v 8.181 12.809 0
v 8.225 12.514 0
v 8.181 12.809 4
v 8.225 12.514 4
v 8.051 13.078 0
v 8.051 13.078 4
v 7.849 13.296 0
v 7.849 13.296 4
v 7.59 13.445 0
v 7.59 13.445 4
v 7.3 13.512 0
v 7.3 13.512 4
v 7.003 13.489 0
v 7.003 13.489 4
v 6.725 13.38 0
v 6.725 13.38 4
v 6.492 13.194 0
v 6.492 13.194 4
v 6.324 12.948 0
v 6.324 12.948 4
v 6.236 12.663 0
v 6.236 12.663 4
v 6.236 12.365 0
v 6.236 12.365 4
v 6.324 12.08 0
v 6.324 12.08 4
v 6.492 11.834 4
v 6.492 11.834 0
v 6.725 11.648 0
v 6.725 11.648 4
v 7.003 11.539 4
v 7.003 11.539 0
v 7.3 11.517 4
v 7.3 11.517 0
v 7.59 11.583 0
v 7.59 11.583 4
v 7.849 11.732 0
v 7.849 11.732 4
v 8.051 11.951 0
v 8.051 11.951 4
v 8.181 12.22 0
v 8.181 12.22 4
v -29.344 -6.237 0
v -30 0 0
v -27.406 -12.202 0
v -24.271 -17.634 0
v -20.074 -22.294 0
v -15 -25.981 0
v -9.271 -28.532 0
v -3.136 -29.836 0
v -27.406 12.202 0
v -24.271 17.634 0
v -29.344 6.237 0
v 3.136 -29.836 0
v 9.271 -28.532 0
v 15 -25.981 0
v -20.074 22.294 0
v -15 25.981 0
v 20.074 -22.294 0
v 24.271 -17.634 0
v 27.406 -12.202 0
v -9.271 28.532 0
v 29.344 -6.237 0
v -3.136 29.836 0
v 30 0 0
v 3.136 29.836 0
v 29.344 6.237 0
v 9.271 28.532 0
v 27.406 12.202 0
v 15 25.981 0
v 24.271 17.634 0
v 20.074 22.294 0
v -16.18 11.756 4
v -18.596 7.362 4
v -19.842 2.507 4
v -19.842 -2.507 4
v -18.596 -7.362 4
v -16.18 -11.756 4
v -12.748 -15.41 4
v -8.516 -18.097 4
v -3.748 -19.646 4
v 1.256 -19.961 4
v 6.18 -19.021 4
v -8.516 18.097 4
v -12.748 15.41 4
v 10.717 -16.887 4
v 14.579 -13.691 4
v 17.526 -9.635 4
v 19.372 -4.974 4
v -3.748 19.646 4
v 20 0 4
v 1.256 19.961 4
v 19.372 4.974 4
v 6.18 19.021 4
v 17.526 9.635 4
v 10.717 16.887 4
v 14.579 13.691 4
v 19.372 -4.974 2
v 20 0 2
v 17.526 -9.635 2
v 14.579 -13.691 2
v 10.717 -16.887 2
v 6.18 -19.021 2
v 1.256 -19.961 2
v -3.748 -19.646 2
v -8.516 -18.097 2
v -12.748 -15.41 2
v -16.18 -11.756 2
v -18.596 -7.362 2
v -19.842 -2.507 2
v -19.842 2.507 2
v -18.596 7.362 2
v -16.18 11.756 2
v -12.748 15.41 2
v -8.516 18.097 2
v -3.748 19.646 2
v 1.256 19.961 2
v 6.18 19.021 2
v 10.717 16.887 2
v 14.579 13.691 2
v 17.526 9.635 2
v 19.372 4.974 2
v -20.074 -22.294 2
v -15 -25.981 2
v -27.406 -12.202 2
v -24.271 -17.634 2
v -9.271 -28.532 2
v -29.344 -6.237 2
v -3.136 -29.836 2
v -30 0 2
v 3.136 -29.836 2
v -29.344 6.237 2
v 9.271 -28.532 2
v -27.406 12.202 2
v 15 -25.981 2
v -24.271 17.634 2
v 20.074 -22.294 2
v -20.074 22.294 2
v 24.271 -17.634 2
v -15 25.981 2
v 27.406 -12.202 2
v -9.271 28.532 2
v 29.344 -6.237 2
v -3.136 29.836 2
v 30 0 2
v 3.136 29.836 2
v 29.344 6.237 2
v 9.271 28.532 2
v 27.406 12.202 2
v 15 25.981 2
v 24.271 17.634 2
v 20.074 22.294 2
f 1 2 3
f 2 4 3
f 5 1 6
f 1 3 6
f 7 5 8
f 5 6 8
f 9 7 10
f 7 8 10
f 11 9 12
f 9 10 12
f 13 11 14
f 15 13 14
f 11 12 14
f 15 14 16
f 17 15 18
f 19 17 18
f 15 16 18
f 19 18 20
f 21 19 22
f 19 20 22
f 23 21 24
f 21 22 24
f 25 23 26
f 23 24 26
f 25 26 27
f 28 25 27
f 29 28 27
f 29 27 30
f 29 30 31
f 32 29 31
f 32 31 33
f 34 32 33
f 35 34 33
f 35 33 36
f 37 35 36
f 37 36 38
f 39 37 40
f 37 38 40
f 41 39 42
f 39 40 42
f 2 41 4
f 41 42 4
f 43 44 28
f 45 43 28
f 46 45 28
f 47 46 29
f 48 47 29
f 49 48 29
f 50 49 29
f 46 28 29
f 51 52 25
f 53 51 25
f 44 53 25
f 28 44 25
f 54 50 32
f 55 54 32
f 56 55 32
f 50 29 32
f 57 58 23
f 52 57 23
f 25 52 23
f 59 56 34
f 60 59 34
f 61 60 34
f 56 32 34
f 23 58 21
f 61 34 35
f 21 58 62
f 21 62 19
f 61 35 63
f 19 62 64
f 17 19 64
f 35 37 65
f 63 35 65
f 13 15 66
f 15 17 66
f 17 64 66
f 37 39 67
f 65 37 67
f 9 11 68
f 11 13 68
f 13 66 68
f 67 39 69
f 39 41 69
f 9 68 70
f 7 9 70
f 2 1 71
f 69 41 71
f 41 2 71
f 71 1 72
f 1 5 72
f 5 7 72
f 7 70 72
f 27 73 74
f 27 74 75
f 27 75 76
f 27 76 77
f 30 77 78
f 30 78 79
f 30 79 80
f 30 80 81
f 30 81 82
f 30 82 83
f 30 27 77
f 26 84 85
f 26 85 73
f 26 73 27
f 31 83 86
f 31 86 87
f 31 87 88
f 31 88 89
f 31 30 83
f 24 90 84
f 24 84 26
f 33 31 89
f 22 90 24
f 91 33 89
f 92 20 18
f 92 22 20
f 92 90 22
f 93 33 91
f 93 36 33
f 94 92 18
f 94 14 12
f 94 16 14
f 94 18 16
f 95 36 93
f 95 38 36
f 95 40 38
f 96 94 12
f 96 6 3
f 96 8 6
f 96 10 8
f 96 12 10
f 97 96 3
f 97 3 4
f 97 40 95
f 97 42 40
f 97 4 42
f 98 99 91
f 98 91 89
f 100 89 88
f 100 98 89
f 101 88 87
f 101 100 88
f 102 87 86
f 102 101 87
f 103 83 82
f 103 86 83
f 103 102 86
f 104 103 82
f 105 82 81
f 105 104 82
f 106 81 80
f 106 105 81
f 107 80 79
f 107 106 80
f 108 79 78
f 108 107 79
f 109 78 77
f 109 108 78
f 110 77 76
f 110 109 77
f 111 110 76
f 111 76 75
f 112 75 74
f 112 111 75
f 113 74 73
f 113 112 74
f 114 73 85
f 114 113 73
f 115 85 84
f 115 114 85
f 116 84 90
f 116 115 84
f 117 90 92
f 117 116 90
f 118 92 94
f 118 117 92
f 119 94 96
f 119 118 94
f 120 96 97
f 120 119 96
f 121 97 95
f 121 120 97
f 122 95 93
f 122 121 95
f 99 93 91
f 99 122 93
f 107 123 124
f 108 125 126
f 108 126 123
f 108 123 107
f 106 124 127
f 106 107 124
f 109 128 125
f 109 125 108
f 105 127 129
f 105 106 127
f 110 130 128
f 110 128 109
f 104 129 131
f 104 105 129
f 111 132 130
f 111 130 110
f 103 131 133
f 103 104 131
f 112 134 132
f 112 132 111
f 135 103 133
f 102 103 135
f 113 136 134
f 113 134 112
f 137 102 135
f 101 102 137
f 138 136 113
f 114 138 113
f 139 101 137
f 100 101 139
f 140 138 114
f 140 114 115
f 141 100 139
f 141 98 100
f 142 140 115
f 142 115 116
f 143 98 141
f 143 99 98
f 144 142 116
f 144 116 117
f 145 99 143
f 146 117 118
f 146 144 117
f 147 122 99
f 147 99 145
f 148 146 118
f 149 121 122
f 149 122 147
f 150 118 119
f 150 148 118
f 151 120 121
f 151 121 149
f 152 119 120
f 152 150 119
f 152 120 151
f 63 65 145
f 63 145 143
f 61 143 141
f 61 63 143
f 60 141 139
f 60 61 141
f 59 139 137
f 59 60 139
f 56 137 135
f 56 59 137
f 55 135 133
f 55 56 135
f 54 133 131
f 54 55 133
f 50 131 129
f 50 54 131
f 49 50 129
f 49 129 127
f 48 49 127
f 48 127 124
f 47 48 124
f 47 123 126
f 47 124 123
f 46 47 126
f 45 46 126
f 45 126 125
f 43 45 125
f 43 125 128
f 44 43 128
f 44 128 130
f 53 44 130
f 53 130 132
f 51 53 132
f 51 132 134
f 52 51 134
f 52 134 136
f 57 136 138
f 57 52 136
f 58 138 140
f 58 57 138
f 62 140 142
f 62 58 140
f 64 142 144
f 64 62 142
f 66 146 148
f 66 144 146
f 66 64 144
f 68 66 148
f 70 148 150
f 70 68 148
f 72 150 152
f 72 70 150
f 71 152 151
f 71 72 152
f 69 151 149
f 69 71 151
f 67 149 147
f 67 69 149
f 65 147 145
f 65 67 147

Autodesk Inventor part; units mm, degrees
ref_plane "YZ Plane" through (0, 0, 0) normal (1, 0, 0) x (0, 1, 0)
ref_plane "XZ Plane" through (0, 0, 0) normal (0, 1, 0) x (-1, 0, 0)
ref_plane "XY Plane" through (0, 0, 0) normal (0, 0, 1) x (1, 0, 0)
sketch "Эскиз1" plane through (0, 0, 0) normal (0, 0, 1) x (1, 0, 0)
  circle A0 centre (0, 0) radius 30
  dimension "d0" = 60
extrude "Выдавливание1" add sketch "Эскиз1" along normal blind 2
sketch "Эскиз2" plane through (0, 0, 2) normal (0, 0, 1) x (1, 0, 0)
  circle A0 centre (0, 0) radius 20
  dimension "d3" = 40
extrude "Выдавливание2" add sketch "Эскиз2" along normal blind 2
sketch "Эскиз3" plane through (0, 0, 4) normal (0, 0, 1) x (1, 0, 0)
  circle A0 centre (7.2251, 12.5143) radius 1
  line L0 (-42, 0) -> (42, 0) projected
  line L1 (0, -42) -> (0, 42) projected
  line L2 (0, 0) -> (7.2251, 12.5143)
  dimension "d6" = 2
  dimension "d10" = 30
extrude "Выдавливание3" cut sketch "Эскиз3" against normal through all
properties part number "Для регулировки 4" material "Сталь, высокопрочная, низколегированная"
